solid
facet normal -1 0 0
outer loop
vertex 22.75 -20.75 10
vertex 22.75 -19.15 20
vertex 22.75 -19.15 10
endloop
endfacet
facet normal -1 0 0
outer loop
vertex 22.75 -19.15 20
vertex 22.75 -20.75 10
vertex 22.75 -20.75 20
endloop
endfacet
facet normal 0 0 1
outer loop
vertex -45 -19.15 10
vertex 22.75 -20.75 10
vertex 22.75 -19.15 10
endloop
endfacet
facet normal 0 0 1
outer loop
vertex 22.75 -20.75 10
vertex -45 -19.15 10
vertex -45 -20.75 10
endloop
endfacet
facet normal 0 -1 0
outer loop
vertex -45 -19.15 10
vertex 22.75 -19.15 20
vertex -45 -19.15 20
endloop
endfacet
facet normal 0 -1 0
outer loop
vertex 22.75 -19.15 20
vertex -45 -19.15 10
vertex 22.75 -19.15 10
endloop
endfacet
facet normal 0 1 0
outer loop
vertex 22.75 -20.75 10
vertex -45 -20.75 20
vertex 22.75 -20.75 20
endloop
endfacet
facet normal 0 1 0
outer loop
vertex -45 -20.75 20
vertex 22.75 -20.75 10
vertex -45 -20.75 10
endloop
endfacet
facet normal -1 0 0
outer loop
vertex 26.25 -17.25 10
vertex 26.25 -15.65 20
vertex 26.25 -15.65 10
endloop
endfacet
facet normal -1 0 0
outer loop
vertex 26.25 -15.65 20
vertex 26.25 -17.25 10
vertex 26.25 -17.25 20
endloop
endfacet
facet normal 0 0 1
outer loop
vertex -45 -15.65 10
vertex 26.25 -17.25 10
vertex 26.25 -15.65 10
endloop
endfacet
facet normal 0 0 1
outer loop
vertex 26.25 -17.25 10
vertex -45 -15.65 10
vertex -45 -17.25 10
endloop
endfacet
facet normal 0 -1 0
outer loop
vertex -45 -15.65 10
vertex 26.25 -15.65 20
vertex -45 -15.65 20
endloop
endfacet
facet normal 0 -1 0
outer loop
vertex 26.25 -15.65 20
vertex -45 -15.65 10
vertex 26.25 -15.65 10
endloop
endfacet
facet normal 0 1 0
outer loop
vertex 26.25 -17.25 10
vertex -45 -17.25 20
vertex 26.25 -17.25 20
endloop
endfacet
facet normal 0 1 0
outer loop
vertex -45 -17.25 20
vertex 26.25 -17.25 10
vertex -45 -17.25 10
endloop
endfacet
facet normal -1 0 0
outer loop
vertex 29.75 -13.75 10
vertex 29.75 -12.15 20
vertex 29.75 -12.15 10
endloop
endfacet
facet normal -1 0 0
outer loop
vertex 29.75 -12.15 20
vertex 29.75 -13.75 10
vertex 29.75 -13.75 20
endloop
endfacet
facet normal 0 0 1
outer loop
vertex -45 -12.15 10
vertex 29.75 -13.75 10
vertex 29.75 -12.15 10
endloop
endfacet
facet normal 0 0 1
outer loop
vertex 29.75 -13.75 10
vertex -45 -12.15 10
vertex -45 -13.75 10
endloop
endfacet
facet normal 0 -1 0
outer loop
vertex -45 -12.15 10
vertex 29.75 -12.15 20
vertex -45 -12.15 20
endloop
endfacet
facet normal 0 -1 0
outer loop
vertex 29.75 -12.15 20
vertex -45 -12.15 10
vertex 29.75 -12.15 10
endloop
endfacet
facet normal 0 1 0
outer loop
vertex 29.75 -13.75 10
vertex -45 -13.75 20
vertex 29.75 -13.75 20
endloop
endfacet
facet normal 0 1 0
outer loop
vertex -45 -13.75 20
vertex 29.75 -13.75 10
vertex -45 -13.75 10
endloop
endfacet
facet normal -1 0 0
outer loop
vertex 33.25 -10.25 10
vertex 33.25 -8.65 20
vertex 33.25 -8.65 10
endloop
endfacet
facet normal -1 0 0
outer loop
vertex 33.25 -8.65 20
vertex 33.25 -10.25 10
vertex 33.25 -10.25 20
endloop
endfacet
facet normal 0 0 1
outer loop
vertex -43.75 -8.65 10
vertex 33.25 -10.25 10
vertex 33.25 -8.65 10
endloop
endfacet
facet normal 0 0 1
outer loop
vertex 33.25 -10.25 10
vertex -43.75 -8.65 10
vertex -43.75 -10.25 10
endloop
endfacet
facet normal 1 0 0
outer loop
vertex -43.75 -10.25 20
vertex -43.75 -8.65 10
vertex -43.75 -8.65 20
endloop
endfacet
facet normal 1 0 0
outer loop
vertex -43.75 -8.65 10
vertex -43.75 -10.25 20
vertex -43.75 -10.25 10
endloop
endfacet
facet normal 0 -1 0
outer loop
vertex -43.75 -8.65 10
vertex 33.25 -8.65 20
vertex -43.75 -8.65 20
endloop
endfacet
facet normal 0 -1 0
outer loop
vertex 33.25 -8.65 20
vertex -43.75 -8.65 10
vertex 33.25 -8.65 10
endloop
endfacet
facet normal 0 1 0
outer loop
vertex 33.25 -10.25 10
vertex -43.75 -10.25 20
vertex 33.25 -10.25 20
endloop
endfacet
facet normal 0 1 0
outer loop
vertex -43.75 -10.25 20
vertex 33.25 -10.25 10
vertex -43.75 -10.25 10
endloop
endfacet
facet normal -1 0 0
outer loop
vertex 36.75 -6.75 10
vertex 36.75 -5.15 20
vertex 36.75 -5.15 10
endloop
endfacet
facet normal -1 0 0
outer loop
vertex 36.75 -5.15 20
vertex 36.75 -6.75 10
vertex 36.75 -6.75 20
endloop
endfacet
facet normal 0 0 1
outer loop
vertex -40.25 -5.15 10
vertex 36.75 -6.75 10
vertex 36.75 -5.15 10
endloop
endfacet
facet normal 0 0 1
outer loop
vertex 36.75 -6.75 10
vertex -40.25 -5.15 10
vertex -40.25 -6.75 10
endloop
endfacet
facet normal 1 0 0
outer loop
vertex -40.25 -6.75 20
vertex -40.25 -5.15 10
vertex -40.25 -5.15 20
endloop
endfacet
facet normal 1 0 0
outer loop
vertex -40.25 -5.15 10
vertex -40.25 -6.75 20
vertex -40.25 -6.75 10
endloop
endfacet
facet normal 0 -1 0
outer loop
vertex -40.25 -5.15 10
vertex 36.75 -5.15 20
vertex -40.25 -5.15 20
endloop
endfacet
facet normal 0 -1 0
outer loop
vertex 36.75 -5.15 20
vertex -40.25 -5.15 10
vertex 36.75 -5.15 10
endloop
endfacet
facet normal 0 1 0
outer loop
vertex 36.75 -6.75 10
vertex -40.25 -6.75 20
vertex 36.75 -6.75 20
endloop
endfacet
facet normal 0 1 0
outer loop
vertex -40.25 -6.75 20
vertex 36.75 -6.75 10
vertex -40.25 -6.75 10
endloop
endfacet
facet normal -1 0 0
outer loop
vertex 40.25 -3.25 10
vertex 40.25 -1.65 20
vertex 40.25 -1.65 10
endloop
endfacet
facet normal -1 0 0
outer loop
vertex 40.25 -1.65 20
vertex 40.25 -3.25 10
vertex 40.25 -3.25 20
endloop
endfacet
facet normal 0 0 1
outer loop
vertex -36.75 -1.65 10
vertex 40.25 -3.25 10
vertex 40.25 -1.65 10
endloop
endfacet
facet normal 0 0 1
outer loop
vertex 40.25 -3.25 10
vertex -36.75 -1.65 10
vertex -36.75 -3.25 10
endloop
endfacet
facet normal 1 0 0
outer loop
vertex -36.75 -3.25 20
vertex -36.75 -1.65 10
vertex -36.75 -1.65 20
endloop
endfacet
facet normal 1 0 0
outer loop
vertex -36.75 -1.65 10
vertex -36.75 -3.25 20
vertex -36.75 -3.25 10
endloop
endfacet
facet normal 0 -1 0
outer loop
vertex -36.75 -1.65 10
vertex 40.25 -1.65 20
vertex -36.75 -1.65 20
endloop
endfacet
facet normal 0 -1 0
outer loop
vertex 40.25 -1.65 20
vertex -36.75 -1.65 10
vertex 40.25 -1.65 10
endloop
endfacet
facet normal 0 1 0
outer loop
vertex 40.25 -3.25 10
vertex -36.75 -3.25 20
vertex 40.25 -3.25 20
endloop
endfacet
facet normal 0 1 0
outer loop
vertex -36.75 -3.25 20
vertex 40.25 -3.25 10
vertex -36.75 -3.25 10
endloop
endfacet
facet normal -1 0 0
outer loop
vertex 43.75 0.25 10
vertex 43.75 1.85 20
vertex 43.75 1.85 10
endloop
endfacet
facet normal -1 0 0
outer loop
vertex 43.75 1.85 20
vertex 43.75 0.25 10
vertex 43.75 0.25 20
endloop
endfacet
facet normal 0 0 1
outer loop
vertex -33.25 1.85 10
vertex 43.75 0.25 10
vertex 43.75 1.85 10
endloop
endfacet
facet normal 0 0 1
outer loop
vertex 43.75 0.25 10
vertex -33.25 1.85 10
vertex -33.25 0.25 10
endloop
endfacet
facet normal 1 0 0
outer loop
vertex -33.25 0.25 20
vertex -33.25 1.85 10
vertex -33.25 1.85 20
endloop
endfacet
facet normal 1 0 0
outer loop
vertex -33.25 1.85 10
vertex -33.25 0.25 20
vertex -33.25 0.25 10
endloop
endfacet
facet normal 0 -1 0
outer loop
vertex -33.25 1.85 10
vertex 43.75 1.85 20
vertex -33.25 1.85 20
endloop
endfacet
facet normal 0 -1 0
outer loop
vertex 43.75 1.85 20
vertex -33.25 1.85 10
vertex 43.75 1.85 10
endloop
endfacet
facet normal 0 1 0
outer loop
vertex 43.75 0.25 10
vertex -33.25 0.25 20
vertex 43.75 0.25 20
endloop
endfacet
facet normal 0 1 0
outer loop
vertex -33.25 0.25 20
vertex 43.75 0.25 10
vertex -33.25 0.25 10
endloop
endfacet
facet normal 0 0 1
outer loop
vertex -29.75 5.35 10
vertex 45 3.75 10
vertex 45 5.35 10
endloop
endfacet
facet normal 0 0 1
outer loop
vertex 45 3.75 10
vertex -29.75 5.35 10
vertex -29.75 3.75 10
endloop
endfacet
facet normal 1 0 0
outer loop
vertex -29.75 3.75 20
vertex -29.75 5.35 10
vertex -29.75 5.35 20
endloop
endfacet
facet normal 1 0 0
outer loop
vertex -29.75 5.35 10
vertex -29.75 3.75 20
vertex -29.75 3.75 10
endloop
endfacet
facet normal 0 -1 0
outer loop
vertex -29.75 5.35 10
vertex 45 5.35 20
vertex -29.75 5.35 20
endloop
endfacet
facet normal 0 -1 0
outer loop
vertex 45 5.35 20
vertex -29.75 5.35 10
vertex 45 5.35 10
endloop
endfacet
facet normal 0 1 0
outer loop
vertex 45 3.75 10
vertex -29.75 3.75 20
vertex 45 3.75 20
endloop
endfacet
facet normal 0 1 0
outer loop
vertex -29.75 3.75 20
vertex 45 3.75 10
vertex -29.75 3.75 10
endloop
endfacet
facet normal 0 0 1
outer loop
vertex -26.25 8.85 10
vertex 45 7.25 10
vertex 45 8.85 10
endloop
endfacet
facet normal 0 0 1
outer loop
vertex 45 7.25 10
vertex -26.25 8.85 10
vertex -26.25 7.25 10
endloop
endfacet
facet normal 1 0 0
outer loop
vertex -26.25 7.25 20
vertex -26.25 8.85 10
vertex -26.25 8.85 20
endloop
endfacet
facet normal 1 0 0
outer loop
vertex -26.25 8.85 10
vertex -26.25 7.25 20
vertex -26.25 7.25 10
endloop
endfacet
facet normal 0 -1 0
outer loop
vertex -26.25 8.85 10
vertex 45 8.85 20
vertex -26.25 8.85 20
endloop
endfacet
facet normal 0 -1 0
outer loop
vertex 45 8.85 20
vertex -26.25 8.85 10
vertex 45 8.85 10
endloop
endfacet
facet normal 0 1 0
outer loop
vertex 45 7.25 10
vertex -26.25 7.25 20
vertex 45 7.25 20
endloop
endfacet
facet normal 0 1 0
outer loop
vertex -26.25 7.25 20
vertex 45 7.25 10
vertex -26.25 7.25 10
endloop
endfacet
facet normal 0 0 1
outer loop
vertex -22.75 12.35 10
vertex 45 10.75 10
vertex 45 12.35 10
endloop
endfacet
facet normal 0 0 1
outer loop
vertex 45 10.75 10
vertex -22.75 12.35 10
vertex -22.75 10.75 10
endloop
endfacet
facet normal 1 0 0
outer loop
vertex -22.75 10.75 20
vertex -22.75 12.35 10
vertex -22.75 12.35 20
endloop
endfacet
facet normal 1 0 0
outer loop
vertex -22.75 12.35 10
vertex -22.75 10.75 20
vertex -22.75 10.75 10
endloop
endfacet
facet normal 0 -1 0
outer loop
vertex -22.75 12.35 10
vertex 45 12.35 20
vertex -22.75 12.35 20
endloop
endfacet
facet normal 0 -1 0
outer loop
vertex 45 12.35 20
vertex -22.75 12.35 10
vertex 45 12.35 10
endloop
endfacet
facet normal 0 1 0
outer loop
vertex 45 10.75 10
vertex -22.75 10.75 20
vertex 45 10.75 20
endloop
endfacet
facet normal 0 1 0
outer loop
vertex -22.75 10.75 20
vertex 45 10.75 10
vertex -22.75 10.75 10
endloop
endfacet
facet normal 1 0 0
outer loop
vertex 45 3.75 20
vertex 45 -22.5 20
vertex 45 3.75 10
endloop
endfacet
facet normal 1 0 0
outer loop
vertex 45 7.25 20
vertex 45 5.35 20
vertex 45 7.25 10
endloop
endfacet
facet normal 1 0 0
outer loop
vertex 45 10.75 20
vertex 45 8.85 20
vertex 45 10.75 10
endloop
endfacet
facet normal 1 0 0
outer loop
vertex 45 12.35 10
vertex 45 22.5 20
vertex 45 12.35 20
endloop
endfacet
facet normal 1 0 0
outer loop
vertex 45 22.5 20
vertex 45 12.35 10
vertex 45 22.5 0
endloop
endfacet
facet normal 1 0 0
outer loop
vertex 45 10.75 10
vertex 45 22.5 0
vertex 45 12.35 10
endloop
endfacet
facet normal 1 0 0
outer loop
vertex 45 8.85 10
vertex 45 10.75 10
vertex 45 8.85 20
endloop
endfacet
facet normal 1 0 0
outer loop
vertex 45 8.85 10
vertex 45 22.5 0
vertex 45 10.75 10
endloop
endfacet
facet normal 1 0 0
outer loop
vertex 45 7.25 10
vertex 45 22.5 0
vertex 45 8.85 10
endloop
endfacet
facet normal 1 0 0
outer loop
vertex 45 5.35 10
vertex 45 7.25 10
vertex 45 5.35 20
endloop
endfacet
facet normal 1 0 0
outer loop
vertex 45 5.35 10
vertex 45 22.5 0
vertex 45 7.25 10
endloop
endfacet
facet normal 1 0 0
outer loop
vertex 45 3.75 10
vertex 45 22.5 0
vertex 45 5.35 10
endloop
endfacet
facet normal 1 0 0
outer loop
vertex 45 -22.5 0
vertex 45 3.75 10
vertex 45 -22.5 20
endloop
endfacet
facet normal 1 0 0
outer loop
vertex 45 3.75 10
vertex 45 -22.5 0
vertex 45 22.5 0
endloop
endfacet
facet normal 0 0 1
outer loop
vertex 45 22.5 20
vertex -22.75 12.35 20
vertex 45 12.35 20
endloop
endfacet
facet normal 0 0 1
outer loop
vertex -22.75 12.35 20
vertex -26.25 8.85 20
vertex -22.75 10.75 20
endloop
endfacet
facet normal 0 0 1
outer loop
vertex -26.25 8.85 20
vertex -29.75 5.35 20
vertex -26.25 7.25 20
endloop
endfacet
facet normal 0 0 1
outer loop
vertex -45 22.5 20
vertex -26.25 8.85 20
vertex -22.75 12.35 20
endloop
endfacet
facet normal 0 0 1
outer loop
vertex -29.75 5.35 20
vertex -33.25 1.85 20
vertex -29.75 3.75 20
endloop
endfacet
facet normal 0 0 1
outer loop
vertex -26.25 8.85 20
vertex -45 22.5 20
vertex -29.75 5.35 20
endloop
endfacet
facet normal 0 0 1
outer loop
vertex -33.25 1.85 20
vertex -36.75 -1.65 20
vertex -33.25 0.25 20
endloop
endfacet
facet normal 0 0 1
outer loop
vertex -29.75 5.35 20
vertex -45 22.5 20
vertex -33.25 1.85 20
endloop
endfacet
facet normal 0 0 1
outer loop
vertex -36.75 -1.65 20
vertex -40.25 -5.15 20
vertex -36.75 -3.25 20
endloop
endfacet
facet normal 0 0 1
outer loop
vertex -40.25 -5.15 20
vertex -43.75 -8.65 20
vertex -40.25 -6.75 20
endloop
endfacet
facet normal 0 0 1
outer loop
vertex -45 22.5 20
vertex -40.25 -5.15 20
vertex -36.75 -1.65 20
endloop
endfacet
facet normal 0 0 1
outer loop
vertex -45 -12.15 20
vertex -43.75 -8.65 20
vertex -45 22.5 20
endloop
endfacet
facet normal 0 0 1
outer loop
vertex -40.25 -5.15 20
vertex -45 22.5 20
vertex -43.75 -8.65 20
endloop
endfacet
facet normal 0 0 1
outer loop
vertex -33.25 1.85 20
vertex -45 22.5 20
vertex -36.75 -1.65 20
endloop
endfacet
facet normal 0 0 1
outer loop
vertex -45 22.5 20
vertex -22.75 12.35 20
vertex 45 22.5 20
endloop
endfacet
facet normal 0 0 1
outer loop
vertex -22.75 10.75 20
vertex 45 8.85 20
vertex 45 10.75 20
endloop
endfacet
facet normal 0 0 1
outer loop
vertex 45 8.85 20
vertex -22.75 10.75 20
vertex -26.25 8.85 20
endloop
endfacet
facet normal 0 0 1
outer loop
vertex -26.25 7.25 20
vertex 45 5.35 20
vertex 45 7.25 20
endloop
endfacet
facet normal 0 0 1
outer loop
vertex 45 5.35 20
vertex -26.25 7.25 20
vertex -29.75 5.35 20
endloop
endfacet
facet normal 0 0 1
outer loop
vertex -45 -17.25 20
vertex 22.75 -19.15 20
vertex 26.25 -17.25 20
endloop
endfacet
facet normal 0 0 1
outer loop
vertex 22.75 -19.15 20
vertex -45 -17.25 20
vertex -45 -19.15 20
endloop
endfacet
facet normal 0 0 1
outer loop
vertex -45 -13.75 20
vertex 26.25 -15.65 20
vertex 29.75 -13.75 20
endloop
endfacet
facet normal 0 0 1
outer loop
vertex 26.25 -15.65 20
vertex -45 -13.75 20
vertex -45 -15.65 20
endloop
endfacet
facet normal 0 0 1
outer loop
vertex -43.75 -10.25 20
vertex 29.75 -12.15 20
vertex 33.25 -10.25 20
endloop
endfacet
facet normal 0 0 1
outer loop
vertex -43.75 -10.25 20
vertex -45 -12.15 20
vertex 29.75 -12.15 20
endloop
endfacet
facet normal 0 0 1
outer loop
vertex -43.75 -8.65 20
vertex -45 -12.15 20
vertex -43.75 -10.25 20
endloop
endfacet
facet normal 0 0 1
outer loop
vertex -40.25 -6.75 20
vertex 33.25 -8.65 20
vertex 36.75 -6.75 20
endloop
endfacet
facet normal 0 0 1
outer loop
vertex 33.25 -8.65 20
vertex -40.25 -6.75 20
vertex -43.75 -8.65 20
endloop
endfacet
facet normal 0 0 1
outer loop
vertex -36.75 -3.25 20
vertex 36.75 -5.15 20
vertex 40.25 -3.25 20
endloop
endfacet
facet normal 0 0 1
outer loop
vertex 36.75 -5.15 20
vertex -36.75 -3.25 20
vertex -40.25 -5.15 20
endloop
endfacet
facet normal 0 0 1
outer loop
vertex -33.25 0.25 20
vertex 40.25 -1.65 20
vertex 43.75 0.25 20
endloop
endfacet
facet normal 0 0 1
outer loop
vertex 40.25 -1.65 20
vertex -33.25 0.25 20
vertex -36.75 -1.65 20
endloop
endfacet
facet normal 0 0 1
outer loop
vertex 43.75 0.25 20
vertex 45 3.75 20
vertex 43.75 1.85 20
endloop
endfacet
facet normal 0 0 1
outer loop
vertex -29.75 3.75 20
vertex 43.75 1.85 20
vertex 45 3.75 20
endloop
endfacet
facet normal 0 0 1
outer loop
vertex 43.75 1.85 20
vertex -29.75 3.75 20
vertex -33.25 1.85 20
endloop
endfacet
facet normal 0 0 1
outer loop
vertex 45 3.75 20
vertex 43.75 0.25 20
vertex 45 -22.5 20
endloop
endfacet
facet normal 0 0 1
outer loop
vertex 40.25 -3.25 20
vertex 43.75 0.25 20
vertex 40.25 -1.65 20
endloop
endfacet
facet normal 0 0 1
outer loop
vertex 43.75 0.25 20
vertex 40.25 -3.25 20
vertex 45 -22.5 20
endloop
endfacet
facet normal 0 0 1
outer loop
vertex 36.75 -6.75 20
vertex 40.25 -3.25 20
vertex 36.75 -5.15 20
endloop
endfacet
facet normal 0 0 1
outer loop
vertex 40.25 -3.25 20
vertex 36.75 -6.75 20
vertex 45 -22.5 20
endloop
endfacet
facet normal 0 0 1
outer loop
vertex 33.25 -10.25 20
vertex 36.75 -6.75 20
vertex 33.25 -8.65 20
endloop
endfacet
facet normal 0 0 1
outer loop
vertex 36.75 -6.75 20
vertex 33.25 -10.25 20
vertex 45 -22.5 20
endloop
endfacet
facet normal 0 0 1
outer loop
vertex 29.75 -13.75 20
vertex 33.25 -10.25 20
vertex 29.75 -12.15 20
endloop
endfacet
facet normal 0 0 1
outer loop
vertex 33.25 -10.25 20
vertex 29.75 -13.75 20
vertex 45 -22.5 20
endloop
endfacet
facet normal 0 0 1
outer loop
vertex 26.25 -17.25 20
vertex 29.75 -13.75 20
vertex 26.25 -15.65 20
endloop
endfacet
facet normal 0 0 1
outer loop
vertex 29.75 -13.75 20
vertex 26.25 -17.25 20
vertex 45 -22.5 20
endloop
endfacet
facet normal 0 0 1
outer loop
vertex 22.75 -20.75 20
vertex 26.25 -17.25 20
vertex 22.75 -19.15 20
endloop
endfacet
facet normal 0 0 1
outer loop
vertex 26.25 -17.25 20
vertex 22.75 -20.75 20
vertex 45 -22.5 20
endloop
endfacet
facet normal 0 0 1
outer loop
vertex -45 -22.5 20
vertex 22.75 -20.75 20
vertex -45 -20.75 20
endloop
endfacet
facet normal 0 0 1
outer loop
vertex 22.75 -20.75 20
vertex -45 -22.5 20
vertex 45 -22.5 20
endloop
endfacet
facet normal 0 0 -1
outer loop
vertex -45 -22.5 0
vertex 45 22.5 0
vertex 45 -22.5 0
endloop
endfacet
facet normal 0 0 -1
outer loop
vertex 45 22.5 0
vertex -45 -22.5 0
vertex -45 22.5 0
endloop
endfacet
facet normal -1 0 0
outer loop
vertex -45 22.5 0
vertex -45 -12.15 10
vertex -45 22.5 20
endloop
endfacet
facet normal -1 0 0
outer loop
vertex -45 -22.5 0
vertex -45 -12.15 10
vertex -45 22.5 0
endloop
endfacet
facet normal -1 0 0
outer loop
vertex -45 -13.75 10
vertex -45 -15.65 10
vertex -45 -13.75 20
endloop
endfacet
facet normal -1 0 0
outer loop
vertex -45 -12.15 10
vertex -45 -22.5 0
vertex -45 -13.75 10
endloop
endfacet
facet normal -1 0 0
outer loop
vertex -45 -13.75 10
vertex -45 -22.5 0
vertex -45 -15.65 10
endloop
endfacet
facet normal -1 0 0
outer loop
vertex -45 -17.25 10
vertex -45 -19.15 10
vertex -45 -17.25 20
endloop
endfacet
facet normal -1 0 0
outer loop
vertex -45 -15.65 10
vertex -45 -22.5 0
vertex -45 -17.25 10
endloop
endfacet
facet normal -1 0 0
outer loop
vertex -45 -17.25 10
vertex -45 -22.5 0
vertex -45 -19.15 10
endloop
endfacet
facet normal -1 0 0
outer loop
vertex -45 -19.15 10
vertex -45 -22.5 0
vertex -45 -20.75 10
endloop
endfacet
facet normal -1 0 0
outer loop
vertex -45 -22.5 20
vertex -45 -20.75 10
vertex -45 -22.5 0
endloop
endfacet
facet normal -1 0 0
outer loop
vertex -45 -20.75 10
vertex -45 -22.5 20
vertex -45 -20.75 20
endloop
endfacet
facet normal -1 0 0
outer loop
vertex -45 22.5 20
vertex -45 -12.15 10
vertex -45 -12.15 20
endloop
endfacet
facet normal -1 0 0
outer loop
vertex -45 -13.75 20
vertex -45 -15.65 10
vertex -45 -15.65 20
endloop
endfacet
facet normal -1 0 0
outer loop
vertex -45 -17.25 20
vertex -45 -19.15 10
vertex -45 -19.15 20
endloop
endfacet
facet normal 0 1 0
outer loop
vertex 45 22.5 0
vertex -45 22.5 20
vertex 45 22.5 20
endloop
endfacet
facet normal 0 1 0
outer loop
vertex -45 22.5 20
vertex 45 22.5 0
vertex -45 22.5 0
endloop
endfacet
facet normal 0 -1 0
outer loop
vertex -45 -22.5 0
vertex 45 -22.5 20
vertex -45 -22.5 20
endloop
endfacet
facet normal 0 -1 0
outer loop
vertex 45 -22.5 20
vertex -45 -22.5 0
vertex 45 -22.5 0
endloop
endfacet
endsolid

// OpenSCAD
// Slide drying rack - holds 10 microscope slides standing upright on their long edge
// Units: mm. Print orientation: base on XY plane, slots open upward (+Z).

// ---------- Block ----------
block_len   = 90;    // block length along X
block_wid   = 45;    // block width along Y
block_ht    = 20;    // block height along Z

// ---------- Slots ----------
slot_count  = 10;    // number of slide slots
slot_len    = 77;    // slot length along X
slot_wid    = 1.6;   // slot width along Y
slot_depth  = 10;    // slot depth from top face (along -Z)
slot_pitch  = 3.5;   // centre-to-centre spacing along Y

// ---------- Misc ----------
eps         = 0.5;   // cutter overshoot past top face
$fn         = 64;    // curve resolution (no curves here, set per rules)

// X position of the first slot so the row is centred on the block
slot_x0 = -(slot_count - 1) * slot_pitch / 2;

difference() {
    // Solid base block, centred in X and Y, resting on z = 0
    translate([-block_len / 2, -block_wid / 2, 0])
        cube([block_len, block_wid, block_ht]);

    // Parallel slots cut into the top face, open at the top
    for (i = [0 : slot_count - 1])
        translate([slot_x0 + i * slot_pitch - slot_len / 2,
                   -block_wid / 2 + slot_pitch / 2 + i * slot_pitch,
                   block_ht - slot_depth])
            cube([slot_len, slot_wid, slot_depth + eps]);
}
